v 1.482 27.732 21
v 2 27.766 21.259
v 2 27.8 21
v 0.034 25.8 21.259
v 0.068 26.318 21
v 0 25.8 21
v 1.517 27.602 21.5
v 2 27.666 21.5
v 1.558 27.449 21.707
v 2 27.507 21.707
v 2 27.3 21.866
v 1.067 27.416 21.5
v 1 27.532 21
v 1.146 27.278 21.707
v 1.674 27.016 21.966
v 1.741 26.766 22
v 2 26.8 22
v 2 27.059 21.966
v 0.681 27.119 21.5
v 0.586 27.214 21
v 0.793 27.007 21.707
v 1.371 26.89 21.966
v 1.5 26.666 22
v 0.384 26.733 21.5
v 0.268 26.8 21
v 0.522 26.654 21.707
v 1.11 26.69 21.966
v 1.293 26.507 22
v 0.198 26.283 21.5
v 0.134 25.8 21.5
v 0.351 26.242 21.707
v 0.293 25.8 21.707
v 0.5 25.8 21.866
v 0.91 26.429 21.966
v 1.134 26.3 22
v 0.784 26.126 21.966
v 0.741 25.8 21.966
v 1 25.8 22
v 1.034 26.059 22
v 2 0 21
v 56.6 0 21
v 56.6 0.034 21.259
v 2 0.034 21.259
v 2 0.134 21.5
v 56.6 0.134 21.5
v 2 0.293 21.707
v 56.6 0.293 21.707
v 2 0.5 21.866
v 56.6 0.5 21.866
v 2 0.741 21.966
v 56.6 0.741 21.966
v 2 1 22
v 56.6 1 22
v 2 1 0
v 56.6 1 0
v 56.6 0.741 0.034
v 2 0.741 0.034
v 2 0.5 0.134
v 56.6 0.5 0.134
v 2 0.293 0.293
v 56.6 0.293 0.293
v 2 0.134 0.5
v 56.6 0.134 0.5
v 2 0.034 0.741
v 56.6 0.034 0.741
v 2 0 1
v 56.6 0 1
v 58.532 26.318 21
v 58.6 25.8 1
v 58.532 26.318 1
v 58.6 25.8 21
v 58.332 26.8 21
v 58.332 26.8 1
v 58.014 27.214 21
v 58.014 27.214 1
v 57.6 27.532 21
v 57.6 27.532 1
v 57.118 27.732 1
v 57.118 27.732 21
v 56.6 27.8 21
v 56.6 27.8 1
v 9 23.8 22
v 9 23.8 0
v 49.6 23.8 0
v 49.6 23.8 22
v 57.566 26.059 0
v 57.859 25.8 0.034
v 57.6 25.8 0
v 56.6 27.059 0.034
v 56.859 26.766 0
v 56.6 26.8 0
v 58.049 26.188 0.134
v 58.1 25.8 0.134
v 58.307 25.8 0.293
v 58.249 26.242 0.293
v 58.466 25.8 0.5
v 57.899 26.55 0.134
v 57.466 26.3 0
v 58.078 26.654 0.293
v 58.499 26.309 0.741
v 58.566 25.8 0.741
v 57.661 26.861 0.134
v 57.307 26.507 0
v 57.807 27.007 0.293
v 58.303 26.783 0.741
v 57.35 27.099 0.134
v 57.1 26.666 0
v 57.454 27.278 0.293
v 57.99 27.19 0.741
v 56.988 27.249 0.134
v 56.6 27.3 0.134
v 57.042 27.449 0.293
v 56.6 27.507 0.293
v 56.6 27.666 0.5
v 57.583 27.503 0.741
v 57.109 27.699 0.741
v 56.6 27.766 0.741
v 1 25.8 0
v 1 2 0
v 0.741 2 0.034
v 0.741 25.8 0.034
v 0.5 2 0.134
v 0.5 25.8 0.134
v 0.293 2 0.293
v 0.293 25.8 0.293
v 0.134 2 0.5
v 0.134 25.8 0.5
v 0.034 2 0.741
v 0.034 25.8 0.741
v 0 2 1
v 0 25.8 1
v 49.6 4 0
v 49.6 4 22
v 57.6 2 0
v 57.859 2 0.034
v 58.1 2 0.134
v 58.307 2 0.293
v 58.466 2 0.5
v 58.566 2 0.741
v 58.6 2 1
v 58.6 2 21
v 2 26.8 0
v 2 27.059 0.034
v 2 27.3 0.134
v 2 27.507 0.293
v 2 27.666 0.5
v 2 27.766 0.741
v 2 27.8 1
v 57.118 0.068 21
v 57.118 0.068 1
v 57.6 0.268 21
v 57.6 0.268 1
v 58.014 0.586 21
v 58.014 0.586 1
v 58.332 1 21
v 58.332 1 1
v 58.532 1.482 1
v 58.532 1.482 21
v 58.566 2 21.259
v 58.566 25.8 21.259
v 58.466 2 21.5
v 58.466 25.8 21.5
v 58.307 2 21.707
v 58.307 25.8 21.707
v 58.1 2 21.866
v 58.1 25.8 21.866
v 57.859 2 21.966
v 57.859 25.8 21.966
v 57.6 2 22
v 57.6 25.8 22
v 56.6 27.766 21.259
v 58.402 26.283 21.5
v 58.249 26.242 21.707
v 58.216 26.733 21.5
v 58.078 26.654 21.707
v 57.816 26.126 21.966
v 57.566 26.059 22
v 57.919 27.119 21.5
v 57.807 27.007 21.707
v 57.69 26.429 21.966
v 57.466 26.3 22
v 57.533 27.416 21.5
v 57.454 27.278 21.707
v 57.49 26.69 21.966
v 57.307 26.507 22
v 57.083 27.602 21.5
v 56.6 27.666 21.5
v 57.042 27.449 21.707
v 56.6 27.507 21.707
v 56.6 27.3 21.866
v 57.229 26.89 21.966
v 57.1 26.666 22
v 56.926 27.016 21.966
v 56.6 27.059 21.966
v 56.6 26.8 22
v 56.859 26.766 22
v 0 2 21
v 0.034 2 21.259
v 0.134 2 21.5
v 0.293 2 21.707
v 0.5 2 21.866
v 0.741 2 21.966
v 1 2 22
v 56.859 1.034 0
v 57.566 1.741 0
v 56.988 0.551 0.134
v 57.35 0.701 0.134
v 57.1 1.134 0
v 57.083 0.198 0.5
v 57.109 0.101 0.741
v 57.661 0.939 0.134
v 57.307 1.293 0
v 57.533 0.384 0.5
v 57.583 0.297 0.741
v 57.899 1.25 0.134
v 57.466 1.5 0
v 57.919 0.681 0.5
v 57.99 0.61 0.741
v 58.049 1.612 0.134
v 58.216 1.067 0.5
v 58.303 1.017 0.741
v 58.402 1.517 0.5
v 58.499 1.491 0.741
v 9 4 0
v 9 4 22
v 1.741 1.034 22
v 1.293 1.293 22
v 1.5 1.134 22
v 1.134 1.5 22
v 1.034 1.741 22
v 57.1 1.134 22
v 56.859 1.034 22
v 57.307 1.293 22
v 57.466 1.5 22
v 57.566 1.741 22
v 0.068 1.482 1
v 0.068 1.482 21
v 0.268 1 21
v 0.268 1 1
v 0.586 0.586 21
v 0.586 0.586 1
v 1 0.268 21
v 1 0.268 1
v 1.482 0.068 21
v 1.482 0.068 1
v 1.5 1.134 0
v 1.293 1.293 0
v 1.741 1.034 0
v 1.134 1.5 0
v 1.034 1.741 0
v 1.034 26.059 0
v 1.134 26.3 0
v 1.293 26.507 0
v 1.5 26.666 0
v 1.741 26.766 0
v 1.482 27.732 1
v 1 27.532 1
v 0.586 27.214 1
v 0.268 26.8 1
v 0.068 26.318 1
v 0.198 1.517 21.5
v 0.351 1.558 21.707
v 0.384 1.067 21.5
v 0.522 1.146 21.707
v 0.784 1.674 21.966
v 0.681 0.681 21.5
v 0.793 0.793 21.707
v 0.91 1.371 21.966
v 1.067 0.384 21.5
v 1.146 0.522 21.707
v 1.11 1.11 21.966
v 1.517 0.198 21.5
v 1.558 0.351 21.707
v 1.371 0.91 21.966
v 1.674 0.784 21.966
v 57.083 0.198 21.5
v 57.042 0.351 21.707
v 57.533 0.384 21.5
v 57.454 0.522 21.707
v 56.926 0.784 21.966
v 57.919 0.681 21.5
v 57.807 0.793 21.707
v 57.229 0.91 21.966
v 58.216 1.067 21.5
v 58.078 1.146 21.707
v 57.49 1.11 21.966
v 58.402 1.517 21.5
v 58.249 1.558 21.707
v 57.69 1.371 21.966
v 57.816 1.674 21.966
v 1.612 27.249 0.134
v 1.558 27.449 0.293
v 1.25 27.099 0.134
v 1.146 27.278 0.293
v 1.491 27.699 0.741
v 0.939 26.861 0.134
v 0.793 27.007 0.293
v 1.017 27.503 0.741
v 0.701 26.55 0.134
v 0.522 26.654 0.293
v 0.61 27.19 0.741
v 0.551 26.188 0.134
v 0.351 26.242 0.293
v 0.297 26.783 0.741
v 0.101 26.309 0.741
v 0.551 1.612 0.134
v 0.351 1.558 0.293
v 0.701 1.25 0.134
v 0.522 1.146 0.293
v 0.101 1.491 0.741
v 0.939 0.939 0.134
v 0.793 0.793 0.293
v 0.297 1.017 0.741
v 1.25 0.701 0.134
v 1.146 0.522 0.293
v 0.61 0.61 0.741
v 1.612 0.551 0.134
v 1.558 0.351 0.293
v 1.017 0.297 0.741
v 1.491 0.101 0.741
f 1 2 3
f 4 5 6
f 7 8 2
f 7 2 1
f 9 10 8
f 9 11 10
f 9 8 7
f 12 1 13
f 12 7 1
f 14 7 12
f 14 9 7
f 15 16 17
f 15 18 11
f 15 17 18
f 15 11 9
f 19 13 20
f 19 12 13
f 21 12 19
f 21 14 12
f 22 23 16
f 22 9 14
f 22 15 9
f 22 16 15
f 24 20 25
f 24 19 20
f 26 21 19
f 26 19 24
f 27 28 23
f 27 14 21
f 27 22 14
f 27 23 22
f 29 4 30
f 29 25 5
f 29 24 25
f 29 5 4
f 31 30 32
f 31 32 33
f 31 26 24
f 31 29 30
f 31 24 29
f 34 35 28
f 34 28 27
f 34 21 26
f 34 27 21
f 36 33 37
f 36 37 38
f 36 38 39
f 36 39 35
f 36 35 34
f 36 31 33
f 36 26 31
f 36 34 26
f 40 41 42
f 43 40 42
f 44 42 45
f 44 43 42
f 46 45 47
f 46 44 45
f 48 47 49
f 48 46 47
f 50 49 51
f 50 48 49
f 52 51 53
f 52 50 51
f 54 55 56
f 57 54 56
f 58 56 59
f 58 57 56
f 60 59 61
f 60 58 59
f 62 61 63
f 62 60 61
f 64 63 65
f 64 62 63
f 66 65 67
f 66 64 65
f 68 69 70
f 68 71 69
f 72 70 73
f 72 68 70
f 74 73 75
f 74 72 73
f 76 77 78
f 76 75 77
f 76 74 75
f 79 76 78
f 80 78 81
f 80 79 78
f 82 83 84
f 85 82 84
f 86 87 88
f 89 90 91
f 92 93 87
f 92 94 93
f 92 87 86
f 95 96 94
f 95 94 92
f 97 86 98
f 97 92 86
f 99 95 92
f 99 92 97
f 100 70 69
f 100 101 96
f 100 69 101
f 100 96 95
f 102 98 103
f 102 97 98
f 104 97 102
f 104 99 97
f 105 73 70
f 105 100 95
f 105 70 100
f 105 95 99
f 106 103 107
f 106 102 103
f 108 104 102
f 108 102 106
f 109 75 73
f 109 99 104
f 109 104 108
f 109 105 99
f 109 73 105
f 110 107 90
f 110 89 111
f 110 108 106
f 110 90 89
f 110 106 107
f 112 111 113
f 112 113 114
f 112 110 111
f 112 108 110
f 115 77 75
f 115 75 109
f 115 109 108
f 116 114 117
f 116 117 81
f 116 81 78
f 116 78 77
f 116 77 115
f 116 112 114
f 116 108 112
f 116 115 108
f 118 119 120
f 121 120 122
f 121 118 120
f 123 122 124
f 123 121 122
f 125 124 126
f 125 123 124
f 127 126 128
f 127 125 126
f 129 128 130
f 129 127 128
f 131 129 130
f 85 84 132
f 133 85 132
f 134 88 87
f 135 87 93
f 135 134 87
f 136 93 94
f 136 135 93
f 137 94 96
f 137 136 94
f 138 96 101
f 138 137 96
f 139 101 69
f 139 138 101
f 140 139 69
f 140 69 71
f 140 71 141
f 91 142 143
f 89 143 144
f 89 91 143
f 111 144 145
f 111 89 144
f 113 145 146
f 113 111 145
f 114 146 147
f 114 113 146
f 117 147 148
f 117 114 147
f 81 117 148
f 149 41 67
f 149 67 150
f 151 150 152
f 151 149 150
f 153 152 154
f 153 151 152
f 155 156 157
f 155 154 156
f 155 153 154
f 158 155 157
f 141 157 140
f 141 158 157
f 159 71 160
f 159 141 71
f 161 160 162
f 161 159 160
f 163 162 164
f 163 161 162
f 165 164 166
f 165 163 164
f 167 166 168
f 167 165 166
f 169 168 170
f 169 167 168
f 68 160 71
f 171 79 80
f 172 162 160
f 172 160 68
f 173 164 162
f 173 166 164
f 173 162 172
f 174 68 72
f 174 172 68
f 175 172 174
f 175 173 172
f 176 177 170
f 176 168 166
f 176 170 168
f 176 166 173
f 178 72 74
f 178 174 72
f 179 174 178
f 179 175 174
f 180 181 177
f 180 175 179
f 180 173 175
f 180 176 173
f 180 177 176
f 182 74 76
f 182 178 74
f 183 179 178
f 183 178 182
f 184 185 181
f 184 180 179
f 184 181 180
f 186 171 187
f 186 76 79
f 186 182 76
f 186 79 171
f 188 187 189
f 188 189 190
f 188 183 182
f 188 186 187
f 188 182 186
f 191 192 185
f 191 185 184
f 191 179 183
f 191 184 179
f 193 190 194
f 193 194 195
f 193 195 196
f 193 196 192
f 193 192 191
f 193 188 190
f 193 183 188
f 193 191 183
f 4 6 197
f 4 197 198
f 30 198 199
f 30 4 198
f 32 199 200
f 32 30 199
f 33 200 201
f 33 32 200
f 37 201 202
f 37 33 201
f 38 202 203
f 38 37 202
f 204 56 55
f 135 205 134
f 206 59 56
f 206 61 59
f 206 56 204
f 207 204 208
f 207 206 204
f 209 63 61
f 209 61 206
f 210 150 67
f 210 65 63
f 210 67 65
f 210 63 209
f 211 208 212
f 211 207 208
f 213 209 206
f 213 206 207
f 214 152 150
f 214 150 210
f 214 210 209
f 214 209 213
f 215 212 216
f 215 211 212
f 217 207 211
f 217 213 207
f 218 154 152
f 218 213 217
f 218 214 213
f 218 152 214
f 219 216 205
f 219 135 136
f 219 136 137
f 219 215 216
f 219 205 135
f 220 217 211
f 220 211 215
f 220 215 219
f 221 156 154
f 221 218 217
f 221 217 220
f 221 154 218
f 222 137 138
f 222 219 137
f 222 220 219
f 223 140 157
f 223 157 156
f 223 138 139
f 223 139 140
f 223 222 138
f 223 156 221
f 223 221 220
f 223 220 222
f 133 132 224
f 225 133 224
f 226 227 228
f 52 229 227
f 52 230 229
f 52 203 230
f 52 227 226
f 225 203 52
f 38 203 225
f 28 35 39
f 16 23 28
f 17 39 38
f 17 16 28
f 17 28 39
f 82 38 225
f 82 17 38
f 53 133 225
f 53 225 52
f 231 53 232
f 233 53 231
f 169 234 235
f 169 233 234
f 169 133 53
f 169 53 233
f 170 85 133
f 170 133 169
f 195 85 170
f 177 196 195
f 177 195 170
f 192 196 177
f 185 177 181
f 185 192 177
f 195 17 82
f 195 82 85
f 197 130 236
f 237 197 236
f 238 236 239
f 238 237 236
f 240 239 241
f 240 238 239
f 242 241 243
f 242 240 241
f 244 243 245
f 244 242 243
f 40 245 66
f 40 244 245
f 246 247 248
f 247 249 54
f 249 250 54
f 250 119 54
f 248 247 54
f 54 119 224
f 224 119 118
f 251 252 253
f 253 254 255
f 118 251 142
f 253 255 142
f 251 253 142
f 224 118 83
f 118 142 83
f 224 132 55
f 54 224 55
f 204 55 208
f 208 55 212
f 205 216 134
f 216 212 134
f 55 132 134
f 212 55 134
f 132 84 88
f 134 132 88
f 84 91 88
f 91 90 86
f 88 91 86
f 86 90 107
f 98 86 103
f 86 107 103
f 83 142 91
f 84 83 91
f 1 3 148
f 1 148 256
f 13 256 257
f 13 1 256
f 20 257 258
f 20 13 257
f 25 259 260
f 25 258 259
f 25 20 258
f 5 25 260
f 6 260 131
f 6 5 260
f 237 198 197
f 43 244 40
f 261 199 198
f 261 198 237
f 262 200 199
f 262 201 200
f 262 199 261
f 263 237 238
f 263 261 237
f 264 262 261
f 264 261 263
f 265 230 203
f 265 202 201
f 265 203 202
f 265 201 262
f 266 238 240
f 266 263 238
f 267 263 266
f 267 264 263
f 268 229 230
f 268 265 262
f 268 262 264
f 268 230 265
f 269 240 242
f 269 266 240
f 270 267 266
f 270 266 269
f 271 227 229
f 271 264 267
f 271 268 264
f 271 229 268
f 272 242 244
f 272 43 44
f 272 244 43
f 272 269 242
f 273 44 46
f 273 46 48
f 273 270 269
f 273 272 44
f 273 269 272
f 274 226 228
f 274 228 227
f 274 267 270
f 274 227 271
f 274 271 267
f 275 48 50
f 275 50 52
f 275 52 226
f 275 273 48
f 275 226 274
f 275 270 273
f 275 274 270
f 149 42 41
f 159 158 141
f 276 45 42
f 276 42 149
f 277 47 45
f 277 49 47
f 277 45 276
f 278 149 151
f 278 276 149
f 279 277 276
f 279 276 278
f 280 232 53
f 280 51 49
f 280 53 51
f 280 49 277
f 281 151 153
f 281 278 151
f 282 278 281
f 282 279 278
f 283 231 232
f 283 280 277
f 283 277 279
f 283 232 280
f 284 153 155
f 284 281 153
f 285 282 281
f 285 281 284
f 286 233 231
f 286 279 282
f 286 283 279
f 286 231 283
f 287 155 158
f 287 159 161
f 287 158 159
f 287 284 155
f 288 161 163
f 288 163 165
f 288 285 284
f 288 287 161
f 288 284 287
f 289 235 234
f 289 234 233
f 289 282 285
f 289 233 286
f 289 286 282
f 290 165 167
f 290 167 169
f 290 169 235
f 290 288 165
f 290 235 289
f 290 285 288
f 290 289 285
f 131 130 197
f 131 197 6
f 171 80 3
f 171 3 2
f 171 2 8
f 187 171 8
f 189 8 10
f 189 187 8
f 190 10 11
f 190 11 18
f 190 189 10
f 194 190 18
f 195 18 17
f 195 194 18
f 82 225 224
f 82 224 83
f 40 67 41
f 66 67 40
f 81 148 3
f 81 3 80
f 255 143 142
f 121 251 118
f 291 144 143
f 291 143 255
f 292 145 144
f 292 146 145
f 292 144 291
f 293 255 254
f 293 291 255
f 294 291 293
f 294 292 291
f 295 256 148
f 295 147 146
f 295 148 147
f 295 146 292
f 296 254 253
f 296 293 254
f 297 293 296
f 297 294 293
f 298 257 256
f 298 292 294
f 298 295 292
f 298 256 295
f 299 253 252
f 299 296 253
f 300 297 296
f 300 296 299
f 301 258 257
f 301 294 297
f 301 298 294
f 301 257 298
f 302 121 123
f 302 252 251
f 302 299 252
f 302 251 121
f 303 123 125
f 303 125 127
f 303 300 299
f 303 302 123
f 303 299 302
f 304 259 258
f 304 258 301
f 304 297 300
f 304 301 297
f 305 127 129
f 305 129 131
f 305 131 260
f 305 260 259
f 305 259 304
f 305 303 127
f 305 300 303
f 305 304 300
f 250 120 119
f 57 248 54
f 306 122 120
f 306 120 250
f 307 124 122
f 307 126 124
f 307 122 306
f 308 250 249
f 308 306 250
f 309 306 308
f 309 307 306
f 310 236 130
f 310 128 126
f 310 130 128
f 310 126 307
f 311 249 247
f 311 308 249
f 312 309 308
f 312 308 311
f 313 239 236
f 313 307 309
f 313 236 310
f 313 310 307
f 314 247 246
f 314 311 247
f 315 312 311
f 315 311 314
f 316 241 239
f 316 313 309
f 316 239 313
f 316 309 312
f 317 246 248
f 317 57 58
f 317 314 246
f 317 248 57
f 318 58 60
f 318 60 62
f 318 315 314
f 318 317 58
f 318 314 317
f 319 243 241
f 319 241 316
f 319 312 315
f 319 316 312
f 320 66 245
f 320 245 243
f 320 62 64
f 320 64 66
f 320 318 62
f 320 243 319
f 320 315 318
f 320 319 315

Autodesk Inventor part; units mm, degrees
ref_plane "YZ Plane" through (0, 0, 0) normal (1, 0, 0) x (0, 1, 0)
ref_plane "XZ Plane" through (0, 0, 0) normal (0, 1, 0) x (-1, 0, 0)
ref_plane "XY Plane" through (0, 0, 0) normal (0, 0, 1) x (1, 0, 0)
sketch "Sketch1" plane through (0, 0, 0) normal (0, 0, 1) x (1, 0, 0)
  line L0 (0, 0) -> (0, 27.8)
  line L1 (0, 27.8) -> (58.6, 27.8)
  line L2 (58.6, 27.8) -> (58.6, 0)
  line L3 (58.6, 0) -> (0, 0)
  line L4 (9, 23.8) -> (49.6, 23.8)
  line L5 (49.6, 23.8) -> (49.6, 4)
  line L6 (49.6, 4) -> (9, 4)
  line L7 (9, 4) -> (9, 23.8)
  point P0 (29.3, 23.8)
  point P1 (29.3, 27.8)
  point P2 (29.3, 4)
  point P3 (58.6, 13.9)
  point P4 (49.6, 13.9)
  dimension "d0" = 58.6
  dimension "d1" = 27.8
  dimension "d2" = 40.6
  dimension "d3" = 19.8
  dimension "d4" = 4
  dimension "d5" = 4
  dimension "d6" = 9
  dimension "d7" = 9
extrude "Extrusion1" add sketch "Sketch1" along normal blind 22
fillet "Fillet1" radius 2 4 edges at (0, 0, 11) (0, 27.8, 11) (58.6, 27.8, 11) (58.6, 0, 11)
fillet "Fillet2" radius 1 16 edges at (0, 13.9, 22) (0.5858, 27.2142, 22) (29.3, 27.8, 22) (58.0142, 27.2142, 22) (58.6, 13.9, 22) (58.0142, 0.5858, 22) (29.3, 0, 22) (0.5858, 0.5858, 22) (29.3, 0, 0) (58.0142, 0.5858, 0) (58.6, 13.9, 0) (58.0142, 27.2142, 0) (29.3, 27.8, 0) (0.5858, 27.2142, 0) (0, 13.9, 0) (0.5858, 0.5858, 0)
sketch "Sketch2" plane through (0, 0, 0) normal (0, 0, -1) x (-1, 0, 0)
  point P0 (0, 0)
sketch "Sketch3" plane through (0, 0, 0) normal (0, 0, -1) x (-1, 0, 0)
  point P0 (0, 0)
properties part number "servo_to_links"
